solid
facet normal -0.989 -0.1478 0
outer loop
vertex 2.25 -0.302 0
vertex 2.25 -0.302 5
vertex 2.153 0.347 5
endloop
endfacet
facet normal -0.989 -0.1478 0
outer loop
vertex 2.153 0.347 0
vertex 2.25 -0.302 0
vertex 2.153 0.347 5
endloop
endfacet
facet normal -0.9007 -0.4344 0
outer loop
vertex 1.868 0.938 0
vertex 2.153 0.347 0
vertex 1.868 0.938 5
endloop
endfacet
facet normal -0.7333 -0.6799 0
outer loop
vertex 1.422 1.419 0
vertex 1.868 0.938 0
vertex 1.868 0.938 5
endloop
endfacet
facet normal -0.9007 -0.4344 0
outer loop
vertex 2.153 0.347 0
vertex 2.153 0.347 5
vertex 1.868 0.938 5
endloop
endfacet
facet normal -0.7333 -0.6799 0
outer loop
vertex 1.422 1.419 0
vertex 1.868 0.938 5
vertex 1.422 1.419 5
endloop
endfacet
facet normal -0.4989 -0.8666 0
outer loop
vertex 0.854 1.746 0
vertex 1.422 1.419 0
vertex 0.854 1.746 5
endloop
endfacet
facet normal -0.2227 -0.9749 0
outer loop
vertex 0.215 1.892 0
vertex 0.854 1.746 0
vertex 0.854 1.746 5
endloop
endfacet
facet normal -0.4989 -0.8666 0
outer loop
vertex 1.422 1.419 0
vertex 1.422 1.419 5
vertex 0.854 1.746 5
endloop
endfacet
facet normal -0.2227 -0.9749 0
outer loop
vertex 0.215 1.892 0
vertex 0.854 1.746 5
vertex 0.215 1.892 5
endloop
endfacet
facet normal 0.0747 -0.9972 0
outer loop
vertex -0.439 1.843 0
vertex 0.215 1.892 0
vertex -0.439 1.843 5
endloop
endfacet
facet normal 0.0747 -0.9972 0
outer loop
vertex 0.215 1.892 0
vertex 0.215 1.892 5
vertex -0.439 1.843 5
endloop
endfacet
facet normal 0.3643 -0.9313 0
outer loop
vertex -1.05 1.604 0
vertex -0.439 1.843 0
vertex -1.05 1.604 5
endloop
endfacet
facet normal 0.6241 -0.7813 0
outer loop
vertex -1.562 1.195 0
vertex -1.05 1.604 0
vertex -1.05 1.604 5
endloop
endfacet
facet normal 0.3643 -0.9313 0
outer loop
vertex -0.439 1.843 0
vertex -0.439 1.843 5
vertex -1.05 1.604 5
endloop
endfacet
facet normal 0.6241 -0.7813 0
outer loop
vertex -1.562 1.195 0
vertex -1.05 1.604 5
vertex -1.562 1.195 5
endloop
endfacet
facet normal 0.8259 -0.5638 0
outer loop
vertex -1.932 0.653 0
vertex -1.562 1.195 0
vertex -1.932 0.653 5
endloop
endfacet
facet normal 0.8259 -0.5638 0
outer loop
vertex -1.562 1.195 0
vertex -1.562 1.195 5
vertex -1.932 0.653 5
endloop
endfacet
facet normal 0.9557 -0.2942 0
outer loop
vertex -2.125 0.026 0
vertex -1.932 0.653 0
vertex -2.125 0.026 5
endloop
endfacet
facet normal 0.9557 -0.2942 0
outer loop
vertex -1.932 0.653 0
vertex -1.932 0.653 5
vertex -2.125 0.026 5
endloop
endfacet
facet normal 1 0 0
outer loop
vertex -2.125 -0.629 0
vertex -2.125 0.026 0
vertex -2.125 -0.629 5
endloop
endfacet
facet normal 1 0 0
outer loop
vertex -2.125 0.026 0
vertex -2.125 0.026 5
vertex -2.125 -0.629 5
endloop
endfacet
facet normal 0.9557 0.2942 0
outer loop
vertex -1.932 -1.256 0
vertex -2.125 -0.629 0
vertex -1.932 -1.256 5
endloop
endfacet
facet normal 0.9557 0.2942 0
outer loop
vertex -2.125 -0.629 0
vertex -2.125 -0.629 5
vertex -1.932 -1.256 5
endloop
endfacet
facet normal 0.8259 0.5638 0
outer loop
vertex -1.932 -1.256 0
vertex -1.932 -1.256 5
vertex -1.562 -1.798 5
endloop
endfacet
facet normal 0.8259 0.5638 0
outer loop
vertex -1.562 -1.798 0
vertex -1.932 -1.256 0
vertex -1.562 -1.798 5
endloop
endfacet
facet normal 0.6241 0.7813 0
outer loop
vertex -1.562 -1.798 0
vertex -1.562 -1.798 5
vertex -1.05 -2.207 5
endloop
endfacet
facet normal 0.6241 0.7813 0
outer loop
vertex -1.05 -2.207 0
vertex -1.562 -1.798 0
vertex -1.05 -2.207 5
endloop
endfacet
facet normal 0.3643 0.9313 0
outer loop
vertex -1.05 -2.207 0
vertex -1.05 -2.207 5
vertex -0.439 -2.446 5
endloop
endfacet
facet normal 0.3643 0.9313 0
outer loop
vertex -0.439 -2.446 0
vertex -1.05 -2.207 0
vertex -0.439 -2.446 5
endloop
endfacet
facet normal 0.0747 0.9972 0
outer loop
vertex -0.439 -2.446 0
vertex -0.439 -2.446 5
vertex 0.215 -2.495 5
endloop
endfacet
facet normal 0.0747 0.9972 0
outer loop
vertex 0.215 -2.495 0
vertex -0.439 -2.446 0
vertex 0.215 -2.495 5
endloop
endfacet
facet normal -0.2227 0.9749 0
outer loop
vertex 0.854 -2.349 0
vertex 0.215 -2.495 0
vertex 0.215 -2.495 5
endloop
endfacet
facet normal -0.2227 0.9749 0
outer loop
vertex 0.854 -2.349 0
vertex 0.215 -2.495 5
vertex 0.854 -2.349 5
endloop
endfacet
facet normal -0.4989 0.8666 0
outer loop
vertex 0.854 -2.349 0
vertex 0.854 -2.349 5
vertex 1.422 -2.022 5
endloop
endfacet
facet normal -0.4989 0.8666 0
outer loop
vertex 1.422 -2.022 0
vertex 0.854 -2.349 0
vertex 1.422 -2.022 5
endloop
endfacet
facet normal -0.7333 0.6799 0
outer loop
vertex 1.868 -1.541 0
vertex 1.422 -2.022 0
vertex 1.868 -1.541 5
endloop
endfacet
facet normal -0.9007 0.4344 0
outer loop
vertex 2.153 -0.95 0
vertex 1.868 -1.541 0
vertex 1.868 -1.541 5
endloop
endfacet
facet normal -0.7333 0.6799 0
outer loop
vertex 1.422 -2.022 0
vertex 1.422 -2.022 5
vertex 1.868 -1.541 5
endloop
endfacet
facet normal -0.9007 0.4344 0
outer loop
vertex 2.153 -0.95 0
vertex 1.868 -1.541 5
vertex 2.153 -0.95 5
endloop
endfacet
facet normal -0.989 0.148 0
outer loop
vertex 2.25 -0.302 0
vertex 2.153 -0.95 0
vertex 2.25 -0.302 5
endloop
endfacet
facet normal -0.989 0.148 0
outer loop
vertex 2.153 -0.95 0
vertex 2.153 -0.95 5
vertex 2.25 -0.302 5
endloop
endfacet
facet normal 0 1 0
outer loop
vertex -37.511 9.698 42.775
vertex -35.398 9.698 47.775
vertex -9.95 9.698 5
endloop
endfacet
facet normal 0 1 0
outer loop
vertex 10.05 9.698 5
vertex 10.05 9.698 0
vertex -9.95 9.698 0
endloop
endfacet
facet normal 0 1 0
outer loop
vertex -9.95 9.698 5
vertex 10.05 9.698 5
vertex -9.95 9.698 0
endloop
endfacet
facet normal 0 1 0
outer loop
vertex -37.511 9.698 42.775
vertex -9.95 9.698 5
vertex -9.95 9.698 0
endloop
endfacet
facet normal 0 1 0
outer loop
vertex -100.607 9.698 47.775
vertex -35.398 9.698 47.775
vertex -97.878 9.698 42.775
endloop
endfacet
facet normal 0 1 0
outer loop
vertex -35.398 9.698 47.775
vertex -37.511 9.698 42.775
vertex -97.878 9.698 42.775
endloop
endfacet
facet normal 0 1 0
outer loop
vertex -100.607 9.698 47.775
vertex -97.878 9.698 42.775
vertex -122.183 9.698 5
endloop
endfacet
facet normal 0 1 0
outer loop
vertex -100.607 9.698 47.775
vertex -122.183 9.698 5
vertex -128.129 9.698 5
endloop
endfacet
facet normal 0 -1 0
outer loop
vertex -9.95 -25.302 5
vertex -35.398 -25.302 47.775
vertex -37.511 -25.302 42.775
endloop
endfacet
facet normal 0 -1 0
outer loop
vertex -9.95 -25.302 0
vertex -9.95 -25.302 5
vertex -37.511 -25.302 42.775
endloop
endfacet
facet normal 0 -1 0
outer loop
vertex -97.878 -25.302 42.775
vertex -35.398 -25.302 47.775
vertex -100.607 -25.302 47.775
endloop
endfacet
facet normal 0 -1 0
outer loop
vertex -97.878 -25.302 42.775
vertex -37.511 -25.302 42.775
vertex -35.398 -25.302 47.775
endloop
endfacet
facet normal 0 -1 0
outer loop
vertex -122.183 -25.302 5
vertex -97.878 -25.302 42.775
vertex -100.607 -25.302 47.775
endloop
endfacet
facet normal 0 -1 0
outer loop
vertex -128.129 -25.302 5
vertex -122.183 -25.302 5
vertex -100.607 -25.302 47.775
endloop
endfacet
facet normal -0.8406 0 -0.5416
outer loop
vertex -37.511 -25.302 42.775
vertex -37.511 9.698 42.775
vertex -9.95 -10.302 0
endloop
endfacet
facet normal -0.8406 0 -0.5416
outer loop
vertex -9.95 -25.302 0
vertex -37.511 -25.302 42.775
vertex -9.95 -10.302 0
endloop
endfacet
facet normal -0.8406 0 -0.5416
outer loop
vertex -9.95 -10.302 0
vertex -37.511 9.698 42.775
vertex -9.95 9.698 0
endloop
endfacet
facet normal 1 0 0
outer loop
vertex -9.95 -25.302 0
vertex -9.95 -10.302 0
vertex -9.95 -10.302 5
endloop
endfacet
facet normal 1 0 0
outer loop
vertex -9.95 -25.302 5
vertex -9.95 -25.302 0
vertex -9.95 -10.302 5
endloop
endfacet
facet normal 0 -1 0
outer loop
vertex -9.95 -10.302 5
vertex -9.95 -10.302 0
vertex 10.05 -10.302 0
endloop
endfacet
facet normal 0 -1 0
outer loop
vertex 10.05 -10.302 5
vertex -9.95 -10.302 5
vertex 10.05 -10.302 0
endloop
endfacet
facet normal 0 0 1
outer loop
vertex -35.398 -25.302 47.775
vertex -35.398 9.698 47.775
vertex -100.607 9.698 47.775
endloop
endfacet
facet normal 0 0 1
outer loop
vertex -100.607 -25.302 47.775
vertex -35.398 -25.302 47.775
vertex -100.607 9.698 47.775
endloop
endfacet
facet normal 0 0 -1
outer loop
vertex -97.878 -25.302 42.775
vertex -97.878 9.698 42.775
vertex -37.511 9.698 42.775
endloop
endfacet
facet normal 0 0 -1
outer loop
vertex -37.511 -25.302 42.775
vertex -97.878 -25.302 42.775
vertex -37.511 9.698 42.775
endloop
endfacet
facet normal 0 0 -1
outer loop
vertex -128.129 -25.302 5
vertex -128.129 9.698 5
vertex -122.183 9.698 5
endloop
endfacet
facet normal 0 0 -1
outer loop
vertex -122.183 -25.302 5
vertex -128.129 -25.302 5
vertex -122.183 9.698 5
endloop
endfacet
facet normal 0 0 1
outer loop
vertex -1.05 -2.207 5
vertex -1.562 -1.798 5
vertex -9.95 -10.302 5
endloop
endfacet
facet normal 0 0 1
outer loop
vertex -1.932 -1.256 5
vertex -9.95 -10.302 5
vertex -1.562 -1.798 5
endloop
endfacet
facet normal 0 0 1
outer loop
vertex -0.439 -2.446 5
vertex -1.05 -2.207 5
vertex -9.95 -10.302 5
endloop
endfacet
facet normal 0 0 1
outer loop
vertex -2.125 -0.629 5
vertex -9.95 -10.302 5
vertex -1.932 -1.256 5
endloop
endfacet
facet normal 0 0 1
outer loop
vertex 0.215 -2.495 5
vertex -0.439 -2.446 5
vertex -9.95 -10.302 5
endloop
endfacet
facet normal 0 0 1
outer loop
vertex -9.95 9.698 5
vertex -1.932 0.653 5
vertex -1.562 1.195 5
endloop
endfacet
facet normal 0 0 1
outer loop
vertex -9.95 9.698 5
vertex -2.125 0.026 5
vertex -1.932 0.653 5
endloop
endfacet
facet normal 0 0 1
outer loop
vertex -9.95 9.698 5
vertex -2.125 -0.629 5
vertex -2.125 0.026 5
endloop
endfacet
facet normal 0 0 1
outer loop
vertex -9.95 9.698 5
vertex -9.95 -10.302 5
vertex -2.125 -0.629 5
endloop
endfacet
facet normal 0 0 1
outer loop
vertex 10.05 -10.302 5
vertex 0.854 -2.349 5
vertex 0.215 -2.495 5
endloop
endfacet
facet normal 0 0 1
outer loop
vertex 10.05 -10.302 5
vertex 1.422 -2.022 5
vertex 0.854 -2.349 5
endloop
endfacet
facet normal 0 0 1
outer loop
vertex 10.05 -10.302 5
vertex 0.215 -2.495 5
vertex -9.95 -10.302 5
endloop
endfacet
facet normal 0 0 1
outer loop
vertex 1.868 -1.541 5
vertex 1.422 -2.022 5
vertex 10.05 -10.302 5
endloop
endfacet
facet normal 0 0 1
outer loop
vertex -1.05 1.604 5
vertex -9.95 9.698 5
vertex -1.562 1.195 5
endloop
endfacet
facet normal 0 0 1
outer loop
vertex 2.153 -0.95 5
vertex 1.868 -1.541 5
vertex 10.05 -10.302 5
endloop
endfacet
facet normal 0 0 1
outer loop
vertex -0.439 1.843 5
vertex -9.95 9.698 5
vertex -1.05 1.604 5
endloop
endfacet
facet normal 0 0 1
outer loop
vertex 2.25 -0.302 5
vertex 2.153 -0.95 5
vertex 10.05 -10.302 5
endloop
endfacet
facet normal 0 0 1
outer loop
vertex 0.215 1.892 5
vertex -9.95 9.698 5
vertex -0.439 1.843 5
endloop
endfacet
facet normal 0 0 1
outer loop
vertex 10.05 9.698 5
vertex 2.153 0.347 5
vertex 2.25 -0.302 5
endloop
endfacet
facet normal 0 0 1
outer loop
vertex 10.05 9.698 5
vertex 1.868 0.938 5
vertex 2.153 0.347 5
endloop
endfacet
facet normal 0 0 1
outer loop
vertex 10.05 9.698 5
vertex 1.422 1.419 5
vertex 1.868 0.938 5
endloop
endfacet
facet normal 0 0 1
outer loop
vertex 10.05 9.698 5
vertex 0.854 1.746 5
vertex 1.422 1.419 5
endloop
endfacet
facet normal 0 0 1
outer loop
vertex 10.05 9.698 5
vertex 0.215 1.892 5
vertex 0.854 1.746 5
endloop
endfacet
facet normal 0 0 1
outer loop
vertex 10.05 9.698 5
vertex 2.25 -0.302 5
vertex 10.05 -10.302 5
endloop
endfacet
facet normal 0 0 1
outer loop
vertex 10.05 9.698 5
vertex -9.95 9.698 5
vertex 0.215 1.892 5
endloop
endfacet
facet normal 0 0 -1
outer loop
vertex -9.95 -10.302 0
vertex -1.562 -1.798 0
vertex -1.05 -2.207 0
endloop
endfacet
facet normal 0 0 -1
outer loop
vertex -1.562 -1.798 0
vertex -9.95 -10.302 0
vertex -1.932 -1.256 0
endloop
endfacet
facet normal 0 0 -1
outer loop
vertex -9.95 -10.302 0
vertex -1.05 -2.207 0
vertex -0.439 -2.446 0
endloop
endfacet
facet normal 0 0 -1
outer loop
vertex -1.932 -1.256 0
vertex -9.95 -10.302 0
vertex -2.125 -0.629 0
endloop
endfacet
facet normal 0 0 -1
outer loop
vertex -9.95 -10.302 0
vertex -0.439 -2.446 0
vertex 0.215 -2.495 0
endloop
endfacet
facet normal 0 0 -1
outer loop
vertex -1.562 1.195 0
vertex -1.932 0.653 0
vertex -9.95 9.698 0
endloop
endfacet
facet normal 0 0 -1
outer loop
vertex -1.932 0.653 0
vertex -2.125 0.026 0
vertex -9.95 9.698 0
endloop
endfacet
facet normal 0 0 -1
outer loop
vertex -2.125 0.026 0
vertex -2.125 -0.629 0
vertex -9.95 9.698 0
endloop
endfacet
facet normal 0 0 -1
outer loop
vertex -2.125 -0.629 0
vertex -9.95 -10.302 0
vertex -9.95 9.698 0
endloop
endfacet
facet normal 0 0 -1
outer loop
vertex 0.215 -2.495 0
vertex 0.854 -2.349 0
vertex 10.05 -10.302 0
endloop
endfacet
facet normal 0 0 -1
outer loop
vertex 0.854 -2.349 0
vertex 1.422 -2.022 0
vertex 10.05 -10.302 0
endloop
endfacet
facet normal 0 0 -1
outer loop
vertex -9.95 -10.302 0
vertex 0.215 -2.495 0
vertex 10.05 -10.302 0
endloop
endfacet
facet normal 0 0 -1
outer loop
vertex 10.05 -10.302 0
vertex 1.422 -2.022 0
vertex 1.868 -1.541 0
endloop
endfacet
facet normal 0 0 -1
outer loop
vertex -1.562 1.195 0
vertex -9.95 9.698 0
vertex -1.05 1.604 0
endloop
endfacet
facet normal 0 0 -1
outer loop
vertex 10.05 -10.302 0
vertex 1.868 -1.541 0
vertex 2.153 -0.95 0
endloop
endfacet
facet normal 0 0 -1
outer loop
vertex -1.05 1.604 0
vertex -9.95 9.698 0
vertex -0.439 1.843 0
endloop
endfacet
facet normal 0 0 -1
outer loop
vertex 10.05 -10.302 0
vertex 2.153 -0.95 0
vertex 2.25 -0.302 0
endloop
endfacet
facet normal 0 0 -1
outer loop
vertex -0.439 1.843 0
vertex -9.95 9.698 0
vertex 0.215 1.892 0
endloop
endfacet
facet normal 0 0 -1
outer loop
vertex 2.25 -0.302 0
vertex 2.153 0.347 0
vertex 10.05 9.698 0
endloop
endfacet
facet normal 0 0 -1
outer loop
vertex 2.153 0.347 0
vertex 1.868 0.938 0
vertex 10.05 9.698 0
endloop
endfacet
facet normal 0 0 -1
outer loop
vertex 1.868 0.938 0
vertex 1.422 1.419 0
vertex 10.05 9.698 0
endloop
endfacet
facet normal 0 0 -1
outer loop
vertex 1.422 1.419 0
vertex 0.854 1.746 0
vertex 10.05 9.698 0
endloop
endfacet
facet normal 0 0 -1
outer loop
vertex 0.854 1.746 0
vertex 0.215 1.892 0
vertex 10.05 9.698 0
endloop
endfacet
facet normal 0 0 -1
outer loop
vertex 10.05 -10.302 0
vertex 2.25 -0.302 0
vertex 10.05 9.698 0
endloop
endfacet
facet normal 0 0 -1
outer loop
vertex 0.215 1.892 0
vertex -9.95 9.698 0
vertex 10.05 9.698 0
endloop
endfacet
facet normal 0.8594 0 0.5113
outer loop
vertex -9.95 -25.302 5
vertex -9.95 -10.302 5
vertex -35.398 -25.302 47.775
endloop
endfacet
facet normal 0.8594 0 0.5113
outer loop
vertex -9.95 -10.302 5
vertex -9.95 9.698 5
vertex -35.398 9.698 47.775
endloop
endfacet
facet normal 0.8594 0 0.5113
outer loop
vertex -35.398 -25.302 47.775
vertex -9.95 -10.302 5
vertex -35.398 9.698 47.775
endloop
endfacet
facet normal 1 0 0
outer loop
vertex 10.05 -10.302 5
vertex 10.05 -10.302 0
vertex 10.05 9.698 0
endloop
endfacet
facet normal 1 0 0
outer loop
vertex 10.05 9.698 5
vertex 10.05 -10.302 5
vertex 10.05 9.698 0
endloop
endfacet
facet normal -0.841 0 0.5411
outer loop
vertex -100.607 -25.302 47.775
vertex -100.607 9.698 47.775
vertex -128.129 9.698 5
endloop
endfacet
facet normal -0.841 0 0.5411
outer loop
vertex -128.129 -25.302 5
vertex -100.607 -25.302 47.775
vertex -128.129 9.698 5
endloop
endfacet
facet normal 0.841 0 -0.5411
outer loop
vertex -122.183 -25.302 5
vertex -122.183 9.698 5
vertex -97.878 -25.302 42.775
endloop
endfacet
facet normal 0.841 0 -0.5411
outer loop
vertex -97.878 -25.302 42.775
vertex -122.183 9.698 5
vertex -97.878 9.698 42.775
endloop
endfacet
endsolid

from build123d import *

# Parameters (mm, degrees)
ESQUISSE2_W             = 20
ESQUISSE2_H             = 20
BOSS_EXTRU_1_DEPTH      = 5
ESQUISSE3_R             = 2.2
ENL_V_MAT_EXTRU_1_DEPTH = 5
BOSS_EXTRU_2_DEPTH      = 35


with BuildPart() as part:
    # Esquisse2 → Boss.-Extru.1 (new body)
    with BuildSketch(Plane.XY):
        with Locations((0.050251256, -0.301507538)):
            Rectangle(ESQUISSE2_W, ESQUISSE2_H)
    extrude(amount=BOSS_EXTRU_1_DEPTH)

    # Esquisse3 → Enlèv. mat.-Extru.1 (cut)
    with BuildSketch(Plane.XY.offset(5)):
        with Locations((0.050251256, -0.301507538)):
            Circle(ESQUISSE3_R)
    extrude(amount=-ENL_V_MAT_EXTRU_1_DEPTH, mode=Mode.SUBTRACT)

    # Esquisse4 → Boss.-Extru.2 (add)
    with BuildSketch(Plane(origin=(0, 9.698492462, 0), x_dir=(1, 0, 0), z_dir=(0, 1, 0))):
        Polygon((-9.949748744, -5), (-35.398476961, -47.775171076), (-100.606984649, -47.775171076), (-128.128833484, -5), (-122.183304286, -5), (-97.878490958, -42.775171076), (-37.511283693, -42.775171076), (-9.949748744, 0), align=None)
    extrude(amount=-BOSS_EXTRU_2_DEPTH)


solid = part.part
